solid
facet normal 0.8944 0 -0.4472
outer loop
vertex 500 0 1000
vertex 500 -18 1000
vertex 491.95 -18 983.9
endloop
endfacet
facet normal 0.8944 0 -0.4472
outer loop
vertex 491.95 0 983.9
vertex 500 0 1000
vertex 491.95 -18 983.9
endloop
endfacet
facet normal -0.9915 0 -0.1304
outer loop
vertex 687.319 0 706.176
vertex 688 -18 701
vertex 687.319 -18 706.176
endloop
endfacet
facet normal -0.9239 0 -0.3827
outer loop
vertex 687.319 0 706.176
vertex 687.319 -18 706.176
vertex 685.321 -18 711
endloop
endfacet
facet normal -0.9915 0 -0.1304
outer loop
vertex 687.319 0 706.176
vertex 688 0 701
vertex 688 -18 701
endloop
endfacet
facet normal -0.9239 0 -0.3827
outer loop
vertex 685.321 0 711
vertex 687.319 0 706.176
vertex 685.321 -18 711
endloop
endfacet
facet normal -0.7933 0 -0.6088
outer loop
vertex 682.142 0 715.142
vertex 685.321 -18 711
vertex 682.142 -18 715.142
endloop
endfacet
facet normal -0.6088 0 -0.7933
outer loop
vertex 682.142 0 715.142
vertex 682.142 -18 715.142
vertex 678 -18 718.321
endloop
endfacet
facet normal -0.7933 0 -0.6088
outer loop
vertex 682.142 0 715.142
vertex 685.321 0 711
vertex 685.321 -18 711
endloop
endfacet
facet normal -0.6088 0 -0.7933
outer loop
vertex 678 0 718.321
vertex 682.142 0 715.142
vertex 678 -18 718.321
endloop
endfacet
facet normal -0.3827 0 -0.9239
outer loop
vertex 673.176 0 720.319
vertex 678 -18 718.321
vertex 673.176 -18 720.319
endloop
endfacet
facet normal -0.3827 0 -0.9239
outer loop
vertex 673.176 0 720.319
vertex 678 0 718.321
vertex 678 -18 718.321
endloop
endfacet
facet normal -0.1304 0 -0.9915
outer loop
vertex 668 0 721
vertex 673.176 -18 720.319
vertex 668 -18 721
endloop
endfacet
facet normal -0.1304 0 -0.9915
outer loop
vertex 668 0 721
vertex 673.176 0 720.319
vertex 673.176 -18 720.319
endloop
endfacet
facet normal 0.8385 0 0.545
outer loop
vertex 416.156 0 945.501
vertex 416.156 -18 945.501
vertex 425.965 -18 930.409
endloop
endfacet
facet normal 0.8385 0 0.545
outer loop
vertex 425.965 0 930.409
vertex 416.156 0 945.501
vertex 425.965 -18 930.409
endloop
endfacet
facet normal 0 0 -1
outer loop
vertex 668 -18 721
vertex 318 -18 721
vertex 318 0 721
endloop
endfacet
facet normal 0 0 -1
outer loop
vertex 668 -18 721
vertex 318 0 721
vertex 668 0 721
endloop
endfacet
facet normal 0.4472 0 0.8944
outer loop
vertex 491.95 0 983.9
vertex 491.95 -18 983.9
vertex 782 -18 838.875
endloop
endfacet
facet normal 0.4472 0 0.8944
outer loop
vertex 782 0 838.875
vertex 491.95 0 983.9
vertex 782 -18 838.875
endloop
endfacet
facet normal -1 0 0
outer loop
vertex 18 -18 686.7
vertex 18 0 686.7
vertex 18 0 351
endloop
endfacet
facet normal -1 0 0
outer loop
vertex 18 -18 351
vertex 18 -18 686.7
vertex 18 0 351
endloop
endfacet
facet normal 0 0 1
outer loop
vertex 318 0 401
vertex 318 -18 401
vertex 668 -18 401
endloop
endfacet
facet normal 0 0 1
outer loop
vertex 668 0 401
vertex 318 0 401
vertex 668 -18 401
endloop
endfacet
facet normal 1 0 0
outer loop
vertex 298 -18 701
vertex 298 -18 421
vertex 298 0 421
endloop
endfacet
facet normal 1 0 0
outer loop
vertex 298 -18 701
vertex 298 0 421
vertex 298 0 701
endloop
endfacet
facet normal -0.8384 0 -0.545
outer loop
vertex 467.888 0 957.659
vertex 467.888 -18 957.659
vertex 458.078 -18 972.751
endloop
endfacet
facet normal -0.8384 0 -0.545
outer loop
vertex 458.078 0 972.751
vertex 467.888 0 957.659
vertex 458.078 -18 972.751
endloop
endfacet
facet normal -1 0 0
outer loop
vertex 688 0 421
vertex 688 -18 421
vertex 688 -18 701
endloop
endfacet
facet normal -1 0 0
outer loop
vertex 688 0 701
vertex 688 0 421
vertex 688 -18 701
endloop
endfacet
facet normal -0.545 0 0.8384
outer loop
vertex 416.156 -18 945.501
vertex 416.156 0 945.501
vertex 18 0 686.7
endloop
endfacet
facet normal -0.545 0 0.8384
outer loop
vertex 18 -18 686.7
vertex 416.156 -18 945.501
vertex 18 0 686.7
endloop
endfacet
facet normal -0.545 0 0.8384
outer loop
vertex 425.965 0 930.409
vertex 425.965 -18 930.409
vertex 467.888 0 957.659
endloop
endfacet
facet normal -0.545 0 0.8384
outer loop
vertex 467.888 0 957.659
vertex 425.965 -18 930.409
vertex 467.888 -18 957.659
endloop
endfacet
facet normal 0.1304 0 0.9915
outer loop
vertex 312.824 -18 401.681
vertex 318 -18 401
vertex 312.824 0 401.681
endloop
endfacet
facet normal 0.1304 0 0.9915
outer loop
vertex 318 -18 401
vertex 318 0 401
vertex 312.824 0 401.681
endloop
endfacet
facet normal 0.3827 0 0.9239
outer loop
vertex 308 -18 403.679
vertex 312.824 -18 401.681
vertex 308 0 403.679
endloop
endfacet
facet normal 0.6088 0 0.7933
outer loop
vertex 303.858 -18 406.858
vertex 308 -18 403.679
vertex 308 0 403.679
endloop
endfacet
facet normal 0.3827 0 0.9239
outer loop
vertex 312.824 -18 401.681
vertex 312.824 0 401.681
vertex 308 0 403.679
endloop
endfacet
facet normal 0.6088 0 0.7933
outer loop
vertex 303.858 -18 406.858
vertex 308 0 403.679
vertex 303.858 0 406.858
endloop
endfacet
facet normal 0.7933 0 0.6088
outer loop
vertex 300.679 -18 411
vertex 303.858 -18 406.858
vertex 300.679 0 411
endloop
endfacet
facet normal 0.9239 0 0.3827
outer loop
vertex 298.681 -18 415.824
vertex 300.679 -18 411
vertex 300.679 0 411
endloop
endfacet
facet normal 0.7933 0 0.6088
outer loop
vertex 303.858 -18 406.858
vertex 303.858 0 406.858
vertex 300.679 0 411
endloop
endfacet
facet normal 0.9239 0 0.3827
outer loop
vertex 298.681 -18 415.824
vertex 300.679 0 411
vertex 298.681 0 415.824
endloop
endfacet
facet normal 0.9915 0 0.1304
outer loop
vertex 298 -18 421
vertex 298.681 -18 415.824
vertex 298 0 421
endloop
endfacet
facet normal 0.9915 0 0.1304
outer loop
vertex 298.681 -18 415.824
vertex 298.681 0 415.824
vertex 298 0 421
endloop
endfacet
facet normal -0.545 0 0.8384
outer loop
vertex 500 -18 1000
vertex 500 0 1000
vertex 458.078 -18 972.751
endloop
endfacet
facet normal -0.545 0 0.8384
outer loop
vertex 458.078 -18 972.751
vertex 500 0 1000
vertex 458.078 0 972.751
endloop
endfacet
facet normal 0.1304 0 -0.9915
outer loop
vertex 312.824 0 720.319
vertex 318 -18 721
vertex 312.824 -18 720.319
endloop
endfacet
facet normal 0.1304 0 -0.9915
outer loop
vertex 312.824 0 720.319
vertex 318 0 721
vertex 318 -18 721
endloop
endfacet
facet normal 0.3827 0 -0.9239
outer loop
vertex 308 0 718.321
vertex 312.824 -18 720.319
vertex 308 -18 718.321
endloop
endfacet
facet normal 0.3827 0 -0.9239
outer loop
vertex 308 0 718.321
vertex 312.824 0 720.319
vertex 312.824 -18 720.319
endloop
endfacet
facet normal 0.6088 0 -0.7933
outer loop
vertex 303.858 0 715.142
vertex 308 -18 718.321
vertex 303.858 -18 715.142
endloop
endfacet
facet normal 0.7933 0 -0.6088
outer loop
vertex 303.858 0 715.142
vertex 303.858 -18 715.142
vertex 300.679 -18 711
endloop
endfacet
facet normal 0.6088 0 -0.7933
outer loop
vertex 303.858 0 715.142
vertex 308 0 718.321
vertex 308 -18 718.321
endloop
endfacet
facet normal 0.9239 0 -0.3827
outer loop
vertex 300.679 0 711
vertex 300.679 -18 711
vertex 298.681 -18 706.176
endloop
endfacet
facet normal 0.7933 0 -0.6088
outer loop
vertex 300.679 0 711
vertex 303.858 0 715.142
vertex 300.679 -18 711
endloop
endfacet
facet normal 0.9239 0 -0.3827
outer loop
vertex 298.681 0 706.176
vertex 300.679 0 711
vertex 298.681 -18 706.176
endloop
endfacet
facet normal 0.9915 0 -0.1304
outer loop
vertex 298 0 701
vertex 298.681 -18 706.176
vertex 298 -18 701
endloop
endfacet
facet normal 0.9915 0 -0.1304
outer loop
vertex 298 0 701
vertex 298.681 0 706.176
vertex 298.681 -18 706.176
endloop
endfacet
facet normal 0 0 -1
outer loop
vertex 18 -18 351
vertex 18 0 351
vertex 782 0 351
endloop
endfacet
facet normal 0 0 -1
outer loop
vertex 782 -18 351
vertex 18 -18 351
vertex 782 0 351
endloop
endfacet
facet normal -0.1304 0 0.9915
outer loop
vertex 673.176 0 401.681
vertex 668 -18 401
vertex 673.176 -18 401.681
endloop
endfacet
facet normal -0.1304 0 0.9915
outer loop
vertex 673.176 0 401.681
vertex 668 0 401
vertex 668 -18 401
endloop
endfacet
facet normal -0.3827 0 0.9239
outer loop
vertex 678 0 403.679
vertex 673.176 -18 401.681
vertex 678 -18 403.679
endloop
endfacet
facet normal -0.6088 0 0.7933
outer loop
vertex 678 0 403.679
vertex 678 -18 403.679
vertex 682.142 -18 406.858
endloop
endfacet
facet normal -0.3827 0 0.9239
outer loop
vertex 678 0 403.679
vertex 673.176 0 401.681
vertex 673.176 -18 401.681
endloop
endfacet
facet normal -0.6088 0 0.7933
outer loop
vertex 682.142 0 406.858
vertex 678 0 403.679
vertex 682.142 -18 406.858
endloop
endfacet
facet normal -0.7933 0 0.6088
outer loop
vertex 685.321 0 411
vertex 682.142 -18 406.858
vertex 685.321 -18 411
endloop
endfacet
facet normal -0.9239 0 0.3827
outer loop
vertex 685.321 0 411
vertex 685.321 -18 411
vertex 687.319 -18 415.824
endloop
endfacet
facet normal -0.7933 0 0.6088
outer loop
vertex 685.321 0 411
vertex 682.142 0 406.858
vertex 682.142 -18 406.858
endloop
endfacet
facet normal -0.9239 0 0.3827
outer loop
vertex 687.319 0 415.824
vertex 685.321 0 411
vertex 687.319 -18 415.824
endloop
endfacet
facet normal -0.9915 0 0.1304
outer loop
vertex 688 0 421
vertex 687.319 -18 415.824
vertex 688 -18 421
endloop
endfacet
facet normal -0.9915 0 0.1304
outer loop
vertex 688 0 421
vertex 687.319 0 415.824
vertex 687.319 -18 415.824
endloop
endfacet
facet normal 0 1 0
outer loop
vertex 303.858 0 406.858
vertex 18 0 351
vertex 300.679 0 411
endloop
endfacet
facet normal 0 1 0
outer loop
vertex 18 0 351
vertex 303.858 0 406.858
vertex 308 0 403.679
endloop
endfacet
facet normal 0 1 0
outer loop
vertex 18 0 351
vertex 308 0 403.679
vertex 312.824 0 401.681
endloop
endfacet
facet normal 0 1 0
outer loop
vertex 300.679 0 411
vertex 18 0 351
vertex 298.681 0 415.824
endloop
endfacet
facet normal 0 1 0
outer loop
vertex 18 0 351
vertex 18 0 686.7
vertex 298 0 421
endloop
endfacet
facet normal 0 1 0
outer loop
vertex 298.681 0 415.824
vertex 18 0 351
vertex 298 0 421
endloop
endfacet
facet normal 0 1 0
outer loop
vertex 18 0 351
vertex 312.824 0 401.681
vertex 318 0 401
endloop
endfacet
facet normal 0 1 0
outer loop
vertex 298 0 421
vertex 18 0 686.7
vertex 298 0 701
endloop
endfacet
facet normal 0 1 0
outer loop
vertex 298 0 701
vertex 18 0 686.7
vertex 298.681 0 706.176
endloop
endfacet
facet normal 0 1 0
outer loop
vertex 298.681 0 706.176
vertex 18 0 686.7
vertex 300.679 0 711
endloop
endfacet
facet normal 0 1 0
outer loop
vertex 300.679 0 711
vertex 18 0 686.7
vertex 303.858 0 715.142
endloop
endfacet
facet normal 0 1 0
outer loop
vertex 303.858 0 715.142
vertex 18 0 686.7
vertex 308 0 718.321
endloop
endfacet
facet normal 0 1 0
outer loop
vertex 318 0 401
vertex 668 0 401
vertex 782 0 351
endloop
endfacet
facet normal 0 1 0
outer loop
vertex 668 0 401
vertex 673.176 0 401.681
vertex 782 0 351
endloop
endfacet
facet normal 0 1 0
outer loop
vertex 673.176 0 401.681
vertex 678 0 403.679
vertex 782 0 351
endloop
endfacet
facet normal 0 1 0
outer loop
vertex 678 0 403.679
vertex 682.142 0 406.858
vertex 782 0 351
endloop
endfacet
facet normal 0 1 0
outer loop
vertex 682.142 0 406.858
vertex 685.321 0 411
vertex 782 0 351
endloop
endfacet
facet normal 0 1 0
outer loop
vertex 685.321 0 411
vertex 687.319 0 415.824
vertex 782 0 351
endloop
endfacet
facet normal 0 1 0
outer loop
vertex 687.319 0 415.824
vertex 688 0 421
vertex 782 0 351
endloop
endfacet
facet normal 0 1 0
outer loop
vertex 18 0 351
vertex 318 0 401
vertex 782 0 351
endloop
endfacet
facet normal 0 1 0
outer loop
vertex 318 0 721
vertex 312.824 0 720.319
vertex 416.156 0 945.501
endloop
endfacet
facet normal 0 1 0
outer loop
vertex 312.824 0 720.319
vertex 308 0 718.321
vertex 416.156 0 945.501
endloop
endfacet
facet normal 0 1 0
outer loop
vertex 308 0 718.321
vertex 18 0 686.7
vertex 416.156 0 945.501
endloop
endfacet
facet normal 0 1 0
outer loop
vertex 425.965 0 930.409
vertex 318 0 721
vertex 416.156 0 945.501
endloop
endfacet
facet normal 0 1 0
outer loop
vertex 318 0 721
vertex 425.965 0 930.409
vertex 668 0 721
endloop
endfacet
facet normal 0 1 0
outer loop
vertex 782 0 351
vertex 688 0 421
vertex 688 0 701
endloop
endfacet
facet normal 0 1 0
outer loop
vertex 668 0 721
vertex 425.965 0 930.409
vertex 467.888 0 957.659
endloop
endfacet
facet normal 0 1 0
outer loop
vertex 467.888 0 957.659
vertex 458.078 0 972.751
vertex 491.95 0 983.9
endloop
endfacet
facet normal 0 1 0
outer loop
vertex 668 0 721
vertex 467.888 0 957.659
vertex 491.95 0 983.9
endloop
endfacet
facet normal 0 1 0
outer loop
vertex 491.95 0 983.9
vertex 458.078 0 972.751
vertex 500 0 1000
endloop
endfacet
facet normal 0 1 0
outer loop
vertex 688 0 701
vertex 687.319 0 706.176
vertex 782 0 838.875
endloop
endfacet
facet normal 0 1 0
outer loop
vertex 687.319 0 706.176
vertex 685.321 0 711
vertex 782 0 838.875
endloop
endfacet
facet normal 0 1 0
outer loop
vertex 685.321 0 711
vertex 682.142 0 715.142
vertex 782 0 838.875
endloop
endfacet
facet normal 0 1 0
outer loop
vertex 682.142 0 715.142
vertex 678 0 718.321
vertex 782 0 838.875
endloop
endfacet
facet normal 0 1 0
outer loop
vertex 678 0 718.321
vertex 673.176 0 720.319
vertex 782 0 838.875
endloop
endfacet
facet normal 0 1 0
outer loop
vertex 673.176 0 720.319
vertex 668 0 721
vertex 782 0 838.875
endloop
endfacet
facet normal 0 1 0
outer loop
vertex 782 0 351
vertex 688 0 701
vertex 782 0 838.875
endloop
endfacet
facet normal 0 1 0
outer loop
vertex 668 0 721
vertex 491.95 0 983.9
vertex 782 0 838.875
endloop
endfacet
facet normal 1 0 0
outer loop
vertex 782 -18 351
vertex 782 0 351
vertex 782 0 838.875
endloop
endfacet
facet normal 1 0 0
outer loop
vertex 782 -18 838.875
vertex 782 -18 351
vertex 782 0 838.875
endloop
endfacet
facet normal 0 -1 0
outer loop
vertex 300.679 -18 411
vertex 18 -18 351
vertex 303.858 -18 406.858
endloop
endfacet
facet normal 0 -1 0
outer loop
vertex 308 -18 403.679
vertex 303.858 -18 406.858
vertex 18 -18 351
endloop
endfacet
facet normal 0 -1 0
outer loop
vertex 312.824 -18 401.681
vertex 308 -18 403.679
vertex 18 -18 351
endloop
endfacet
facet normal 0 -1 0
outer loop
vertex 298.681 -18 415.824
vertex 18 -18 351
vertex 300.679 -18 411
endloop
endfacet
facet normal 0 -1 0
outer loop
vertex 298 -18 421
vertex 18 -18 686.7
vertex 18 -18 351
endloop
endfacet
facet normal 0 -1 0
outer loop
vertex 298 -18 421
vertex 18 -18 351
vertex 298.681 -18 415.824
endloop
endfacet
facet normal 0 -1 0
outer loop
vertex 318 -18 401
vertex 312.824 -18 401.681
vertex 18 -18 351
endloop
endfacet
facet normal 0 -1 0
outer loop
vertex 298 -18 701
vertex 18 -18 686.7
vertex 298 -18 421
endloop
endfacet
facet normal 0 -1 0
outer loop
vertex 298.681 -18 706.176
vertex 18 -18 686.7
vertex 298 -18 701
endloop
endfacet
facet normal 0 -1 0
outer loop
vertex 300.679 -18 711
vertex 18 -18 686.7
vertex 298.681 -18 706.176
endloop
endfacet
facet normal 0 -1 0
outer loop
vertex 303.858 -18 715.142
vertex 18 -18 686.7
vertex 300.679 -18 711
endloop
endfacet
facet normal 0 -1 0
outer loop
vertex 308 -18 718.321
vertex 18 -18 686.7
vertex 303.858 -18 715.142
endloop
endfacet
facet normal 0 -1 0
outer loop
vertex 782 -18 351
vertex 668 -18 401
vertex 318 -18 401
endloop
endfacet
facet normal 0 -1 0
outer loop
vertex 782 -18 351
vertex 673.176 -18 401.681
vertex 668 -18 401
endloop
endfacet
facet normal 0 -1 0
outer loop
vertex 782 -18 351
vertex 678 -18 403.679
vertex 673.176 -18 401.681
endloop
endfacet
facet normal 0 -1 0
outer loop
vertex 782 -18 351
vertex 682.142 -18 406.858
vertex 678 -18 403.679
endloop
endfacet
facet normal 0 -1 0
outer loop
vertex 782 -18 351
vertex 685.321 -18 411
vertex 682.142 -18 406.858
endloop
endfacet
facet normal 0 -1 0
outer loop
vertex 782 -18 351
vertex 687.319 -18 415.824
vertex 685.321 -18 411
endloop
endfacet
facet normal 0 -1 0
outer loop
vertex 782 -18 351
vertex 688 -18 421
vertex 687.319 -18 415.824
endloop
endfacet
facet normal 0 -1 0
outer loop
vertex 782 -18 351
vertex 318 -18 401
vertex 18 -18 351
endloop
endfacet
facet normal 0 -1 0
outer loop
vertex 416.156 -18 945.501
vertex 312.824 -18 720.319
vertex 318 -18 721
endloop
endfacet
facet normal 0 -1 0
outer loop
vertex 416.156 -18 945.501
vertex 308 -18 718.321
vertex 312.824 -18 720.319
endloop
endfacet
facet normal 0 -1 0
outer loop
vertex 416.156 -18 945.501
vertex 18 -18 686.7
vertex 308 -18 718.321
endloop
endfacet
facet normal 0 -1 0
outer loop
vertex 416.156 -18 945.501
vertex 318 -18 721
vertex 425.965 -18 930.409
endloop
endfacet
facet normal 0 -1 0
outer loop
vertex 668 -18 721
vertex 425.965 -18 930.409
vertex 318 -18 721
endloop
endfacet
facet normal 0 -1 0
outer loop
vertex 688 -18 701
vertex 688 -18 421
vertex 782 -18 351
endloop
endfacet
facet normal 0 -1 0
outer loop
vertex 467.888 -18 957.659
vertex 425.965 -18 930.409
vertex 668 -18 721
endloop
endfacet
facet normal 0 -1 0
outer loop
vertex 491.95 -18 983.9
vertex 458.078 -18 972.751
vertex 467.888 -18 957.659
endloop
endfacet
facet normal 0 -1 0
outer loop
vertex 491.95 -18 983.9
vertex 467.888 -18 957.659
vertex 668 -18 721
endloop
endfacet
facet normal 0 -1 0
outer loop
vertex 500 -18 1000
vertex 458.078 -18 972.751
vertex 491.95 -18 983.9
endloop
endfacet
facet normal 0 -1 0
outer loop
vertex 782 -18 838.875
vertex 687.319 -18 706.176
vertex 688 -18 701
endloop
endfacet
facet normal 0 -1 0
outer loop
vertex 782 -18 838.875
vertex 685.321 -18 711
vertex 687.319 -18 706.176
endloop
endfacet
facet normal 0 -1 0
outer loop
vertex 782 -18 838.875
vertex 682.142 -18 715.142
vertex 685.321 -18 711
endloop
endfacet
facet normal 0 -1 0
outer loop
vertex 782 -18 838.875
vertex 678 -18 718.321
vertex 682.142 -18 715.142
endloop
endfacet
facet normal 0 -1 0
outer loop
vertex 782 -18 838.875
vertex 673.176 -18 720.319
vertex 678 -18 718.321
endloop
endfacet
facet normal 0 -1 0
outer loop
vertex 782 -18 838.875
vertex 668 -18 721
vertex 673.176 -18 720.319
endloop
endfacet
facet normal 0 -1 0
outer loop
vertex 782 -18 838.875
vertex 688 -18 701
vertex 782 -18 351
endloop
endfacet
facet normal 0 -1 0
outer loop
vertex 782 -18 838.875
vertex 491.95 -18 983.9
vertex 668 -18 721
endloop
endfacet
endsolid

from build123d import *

# Parameters (mm, degrees)
F1_DEPTH  = 18
F4_W      = 390
F4_H      = 320
F5_DEPTH  = 18
F6_R      = 20
F8_DEPTH  = 25
F10_DEPTH = 18


with BuildPart() as f1:
    # F0 (on Front) → F1 (new body)
    with BuildSketch(Plane.XZ):
        Polygon((500, 1000), (18, 686.7), (18, 351), (782, 351), (782, 859), align=None)
    extrude(amount=F1_DEPTH)

    # F4 (on face) → F5 (cut, through all)
    with BuildSketch(Plane.XZ.offset(18)):
        with Locations((493, 561)):
            Rectangle(F4_W, F4_H)
    extrude(amount=-F5_DEPTH, mode=Mode.SUBTRACT)

    # F6
    f6_edges = [f1.edges().sort_by_distance(p)[0] for p in [
        (298, -9, 721),
        (688, -9, 721),
        (298, -9, 401),
        (688, -9, 401),
    ]]
    fillet(f6_edges, radius=F6_R)

    # F7 (on face) → F8 (cut)
    with BuildSketch(Plane.XZ.offset(18)):
        Polygon((458.077819, 972.750582), (416.155638, 945.501165), (425.965429, 930.40918), (467.887609, 957.658597), align=None)
    extrude(amount=-F8_DEPTH, mode=Mode.SUBTRACT)

    # F9 (on face) → F10 (cut, through all)
    with BuildSketch(Plane.XZ.offset(18)):
        Polygon((857.770876, 821.114562), (500, 1000), (491.950155, 983.900311), (849.721032, 805.014872), align=None)
    extrude(amount=-F10_DEPTH, mode=Mode.SUBTRACT)


solid = f1.part
